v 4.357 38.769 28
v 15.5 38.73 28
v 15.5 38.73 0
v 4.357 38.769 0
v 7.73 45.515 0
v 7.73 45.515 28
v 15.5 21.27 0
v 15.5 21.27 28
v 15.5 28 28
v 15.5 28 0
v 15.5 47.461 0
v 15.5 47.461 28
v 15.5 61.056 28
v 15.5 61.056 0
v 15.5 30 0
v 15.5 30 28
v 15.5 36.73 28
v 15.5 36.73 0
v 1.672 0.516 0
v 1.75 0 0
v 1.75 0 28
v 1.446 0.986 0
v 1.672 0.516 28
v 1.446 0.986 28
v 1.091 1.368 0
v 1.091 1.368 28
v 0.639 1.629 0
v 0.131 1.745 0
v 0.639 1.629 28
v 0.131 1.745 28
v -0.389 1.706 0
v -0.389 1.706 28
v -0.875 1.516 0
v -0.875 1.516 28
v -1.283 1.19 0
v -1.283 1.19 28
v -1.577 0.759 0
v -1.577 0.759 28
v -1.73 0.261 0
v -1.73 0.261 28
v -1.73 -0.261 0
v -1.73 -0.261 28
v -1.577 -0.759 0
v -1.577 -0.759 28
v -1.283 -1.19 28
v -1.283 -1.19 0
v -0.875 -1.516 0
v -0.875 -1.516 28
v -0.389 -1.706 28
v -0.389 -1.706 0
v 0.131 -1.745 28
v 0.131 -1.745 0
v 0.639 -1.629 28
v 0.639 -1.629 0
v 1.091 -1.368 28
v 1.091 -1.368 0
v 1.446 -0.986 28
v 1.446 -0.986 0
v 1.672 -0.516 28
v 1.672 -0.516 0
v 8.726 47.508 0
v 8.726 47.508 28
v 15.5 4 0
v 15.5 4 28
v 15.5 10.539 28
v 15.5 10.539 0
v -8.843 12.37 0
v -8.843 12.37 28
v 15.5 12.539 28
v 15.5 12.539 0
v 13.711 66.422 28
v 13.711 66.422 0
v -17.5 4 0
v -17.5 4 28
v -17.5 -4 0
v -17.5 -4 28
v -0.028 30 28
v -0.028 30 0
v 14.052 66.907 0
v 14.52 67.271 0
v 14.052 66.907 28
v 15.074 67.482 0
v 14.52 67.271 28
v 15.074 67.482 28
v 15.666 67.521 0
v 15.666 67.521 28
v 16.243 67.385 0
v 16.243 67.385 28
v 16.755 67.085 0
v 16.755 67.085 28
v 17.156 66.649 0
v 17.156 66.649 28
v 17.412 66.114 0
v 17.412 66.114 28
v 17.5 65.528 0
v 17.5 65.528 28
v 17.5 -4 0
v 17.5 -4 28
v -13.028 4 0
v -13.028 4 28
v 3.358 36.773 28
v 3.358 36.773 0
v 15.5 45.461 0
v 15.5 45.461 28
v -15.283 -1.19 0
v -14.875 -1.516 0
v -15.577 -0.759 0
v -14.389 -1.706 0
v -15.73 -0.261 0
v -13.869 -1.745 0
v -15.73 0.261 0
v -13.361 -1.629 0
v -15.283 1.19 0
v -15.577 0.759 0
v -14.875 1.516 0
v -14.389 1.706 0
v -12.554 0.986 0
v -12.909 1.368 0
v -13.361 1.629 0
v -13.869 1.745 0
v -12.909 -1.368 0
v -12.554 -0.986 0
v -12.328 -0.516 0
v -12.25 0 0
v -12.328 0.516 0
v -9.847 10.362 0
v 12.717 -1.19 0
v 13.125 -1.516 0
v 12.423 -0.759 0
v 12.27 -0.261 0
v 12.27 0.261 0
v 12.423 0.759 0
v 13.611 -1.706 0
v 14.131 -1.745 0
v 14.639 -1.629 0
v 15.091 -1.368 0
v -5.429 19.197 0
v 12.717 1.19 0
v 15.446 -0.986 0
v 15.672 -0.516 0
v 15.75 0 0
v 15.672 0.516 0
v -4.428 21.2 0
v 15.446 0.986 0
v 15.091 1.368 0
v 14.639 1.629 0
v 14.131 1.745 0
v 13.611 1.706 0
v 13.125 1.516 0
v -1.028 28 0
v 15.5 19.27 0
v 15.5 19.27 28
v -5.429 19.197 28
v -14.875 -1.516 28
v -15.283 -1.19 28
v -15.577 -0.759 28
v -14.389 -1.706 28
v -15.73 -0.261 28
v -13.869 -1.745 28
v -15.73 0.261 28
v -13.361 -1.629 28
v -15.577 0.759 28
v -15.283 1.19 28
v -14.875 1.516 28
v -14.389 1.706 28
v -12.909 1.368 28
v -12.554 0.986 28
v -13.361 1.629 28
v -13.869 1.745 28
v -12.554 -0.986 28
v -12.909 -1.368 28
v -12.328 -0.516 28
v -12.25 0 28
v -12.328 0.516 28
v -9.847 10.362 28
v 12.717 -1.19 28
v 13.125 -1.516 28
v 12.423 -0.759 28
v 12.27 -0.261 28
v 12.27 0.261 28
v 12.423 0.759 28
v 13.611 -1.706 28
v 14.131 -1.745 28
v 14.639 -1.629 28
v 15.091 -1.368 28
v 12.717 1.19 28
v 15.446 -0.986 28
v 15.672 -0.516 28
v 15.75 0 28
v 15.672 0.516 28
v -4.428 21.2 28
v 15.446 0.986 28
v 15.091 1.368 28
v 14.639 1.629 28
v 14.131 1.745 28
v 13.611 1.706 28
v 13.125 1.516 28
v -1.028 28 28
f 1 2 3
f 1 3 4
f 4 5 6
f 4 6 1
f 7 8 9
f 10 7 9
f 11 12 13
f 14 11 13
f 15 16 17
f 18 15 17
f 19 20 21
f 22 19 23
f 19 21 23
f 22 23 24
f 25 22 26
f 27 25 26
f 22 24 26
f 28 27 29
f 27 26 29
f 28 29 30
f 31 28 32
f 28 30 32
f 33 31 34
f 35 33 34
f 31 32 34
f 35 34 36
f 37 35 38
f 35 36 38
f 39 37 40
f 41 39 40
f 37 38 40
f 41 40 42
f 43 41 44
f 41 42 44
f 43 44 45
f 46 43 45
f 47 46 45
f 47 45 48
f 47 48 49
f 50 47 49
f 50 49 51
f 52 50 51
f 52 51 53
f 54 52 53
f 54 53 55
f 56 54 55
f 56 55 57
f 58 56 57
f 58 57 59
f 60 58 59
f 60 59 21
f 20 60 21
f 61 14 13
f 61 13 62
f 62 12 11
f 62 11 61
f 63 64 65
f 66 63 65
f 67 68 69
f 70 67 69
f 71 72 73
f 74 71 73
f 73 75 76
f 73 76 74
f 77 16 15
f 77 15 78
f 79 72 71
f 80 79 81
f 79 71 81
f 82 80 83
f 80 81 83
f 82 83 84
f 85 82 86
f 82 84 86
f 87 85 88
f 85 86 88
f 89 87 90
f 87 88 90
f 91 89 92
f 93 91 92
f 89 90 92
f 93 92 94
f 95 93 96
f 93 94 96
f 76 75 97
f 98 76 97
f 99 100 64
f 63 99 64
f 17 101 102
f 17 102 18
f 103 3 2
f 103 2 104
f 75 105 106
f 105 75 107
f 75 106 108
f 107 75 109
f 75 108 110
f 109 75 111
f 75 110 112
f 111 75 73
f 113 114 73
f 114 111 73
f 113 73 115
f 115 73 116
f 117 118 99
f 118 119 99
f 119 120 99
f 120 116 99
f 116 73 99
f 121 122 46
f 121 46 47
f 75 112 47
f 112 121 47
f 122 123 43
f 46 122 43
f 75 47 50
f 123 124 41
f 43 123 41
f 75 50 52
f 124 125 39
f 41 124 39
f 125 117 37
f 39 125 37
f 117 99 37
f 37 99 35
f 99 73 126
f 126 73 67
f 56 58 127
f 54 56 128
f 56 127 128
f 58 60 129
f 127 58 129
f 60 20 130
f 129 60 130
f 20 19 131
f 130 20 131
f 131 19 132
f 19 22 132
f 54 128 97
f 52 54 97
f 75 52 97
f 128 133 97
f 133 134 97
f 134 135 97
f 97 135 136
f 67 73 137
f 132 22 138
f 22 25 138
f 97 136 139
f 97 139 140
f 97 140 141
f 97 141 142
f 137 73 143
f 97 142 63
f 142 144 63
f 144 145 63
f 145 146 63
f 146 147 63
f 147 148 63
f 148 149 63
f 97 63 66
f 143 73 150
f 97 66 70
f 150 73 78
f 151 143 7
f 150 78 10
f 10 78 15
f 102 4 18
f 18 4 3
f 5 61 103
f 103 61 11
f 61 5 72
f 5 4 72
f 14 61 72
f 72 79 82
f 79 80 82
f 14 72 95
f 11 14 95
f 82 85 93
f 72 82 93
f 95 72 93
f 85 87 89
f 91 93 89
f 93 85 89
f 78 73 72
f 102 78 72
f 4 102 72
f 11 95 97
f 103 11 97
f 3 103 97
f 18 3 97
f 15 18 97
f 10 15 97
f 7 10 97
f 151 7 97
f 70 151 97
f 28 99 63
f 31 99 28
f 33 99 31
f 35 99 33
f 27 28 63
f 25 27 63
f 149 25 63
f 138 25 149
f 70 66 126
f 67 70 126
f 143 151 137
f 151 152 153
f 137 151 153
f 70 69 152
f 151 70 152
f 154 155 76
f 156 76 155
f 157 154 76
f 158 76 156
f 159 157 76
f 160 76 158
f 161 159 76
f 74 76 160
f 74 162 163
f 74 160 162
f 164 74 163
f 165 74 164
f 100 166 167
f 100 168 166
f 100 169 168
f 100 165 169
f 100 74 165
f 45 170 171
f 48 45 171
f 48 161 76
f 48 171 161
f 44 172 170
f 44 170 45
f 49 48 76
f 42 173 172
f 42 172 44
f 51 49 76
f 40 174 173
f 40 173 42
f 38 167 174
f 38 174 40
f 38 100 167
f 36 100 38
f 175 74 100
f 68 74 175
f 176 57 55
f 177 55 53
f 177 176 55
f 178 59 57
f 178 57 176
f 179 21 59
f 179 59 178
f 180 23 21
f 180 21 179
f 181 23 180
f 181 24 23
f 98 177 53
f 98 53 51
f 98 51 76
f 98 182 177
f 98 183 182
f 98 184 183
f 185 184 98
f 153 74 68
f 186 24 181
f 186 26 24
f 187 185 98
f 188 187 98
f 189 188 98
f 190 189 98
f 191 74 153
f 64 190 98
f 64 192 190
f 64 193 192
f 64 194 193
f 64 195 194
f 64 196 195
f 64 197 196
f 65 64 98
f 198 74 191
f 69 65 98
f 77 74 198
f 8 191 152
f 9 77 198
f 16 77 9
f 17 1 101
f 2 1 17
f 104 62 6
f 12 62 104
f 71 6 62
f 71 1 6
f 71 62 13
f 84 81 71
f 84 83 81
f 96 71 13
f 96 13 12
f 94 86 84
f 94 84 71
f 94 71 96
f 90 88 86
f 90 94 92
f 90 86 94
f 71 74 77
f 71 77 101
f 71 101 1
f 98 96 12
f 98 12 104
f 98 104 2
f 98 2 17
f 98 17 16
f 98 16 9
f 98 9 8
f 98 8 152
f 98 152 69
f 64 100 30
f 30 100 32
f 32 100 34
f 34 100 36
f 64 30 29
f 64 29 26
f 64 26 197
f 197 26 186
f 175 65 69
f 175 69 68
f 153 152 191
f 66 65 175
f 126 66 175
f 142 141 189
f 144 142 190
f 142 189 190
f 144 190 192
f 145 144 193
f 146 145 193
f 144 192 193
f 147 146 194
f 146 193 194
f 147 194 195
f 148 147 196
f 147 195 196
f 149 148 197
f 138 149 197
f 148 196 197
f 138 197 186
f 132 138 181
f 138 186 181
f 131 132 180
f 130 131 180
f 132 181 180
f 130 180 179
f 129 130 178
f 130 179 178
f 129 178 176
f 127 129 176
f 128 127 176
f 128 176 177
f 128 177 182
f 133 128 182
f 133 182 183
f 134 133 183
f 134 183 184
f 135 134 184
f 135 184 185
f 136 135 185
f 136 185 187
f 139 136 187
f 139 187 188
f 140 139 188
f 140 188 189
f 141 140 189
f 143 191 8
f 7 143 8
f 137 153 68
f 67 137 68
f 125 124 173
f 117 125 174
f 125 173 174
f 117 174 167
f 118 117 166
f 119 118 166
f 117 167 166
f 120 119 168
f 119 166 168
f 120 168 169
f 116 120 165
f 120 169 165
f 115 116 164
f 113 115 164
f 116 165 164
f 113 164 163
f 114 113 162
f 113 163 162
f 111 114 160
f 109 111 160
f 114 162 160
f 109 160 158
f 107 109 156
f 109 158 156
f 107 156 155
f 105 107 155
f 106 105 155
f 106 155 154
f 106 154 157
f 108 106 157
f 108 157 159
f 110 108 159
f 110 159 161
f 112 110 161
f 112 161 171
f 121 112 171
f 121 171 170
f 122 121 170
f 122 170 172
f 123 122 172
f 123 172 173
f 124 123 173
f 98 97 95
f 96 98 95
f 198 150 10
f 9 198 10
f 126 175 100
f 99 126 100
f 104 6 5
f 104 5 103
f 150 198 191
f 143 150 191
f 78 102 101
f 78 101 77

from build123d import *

# Parameters (mm, degrees)
SKETCH_1_W          = 35
SKETCH_1_H          = 8
EXTRUDE_1_DEPTH     = 28
SKETCH_2_R          = 1.75
CUT_EXTRUDE_1_DEPTH = 29
CUT_EXTRUDE_2_DEPTH = 29
FILLET_1_R          = 2
EXTRUDE_2_DEPTH     = 28


with BuildPart() as part:
    # Эскиз1 → Бобышка-Вытянуть1 (new body)
    with BuildSketch(Plane.XY):
        Polygon((17.5, 4), (17.5, 74), (-17.5, 4), align=None)
        Rectangle(SKETCH_1_W, SKETCH_1_H)
    extrude(amount=EXTRUDE_1_DEPTH)

    # Эскиз2 → Вырез-Вытянуть1 (cut, through all)
    with BuildSketch(Plane.XY.offset(28)):
        Circle(SKETCH_2_R)
        with Locations((-14, 0)):
            Circle(SKETCH_2_R)
        with Locations((14, 0)):
            Circle(SKETCH_2_R)
    extrude(amount=-CUT_EXTRUDE_1_DEPTH, mode=Mode.SUBTRACT)

    # Эскиз3 → Вырез-Вытянуть2 (cut, through all)
    with BuildSketch(Plane.XY.offset(28)):
        Polygon((-13.027864045, 4), (15.5, 4), (15.5, 61.05572809), align=None)
    extrude(amount=-CUT_EXTRUDE_2_DEPTH, mode=Mode.SUBTRACT)

    # Скругление1
    fillet_1_edges = [part.edges().sort_by_distance(p)[0] for p in [
        (17.5, 74, 14),
    ]]
    fillet(fillet_1_edges, radius=FILLET_1_R)

    # Эскиз5 → Бобышка-Вытянуть2 (add)
    with BuildSketch(Plane.XY.offset(28)):
        Polygon((15.5, 12.539466863), (15.5, 10.539418123), (-9.84663286, 10.362462369), (-8.843105462, 12.369517166), align=None)
        Polygon((15.5, 21.269833716), (15.5, 19.269821531), (-5.429482266, 19.196763559), (-4.427727775, 21.200272541), align=None)
        Polygon((-0.027864045, 30), (-1.027864045, 28), (15.5, 28), (15.5, 30), align=None)
        Polygon((4.356674041, 38.769076173), (3.358410255, 36.7725486), (15.5, 36.730166284), (15.5, 38.730178469), align=None)
        Polygon((8.726072744, 47.507873578), (7.729527032, 45.514782153), (15.5, 45.460533137), (15.5, 47.460581877), align=None)
    extrude(amount=-EXTRUDE_2_DEPTH)


solid = part.part
